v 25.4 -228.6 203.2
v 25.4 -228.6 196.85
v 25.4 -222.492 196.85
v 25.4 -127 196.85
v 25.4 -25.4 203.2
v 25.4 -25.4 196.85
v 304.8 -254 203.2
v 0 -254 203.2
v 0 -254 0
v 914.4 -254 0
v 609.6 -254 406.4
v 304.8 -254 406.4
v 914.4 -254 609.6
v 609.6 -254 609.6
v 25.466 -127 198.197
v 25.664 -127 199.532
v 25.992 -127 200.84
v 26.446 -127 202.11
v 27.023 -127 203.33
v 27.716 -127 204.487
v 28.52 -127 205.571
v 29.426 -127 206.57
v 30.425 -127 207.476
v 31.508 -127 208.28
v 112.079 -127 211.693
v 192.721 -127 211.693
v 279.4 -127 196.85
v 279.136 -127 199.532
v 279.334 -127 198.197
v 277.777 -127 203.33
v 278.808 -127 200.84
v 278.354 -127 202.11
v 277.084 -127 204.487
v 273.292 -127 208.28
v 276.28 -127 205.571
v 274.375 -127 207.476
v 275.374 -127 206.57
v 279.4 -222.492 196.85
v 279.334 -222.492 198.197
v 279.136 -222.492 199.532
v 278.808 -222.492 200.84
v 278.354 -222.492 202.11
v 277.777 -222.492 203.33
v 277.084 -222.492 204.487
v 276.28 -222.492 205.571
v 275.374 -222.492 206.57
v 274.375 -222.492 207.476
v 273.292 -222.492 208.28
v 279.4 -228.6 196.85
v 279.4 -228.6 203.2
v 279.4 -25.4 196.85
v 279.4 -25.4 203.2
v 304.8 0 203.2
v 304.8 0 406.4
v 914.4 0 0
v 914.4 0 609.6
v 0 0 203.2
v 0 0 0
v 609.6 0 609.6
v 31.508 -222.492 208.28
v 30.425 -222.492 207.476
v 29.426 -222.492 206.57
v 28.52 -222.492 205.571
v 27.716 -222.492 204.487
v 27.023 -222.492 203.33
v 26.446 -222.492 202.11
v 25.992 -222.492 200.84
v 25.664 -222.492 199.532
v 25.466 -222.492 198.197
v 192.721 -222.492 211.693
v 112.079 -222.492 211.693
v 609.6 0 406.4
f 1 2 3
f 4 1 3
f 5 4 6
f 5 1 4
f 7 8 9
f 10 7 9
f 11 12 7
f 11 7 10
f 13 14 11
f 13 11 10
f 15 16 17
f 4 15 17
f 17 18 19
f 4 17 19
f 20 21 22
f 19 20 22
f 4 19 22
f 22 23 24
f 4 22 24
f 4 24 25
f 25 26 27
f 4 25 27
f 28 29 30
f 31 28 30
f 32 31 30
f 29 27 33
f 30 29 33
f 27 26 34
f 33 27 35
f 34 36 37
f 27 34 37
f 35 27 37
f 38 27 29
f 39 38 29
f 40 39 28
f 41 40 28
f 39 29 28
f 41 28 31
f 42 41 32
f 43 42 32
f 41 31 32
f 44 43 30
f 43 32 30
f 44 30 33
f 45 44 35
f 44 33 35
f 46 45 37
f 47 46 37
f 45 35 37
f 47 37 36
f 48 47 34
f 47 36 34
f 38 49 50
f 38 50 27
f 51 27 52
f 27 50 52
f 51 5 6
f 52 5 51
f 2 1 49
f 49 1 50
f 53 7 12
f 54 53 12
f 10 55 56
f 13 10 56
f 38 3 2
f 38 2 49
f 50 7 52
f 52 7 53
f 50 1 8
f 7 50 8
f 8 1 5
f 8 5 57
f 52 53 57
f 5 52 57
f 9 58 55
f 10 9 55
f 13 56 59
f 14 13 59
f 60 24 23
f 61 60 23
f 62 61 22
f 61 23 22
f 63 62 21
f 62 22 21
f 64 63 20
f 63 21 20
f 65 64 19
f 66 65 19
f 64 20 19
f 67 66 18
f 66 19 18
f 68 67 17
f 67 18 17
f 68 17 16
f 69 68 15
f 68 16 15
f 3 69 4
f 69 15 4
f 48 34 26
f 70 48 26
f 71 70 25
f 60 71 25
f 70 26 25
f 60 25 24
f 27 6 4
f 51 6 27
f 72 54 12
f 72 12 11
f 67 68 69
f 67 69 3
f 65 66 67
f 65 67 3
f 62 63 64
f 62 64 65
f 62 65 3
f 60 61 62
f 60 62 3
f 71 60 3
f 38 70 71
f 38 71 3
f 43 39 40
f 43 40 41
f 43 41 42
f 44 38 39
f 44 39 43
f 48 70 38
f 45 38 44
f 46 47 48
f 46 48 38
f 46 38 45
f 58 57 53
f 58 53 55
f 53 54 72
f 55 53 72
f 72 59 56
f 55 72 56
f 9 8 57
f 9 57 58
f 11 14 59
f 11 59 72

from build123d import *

# Parameters (mm, degrees)
F0_W     = 304.8
F0_H     = 203.2
F1_DEPTH = 254
F2_W     = 254
F2_H     = 203.2
F3_DEPTH = 6.35
F7_DEPTH = 95.491579


with BuildPart() as f1:
    # F0 (on Front) → F1 (new body)
    with BuildSketch(Plane.XZ):
        with Locations((457.2, 304.8)):
            Rectangle(F0_W, F0_H)
        Polygon((609.6, 203.2), (914.4, 203.2), (914.4, 609.6), (609.6, 609.6), (609.6, 406.4), align=None)
        Polygon((0, 203.2), (0, 0), (914.4, 0), (914.4, 203.2), (609.6, 203.2), (304.8, 203.2), align=None)
    extrude(amount=F1_DEPTH)

    # F2 (on face) → F3 (cut)
    with BuildSketch(Plane.XY.offset(203.2)):
        with Locations((152.4, -127)):
            Rectangle(F2_W, F2_H)
    extrude(amount=-F3_DEPTH, mode=Mode.SUBTRACT)

    # F6 (on offset) → F7 (join)
    with BuildSketch(Plane.XZ.offset(127)):
        with BuildLine():
            ThreePointArc((273.291586, 208.28), (152.400003, 212.119769), (31.50842, 208.28))
            ThreePointArc((31.50842, 208.28), (27.022893, 203.329925), (25.4, 196.85))
            Line((25.4, 196.85), (279.4, 196.85))
            ThreePointArc((279.4, 196.85), (277.777109, 203.329923), (273.291586, 208.28))
        make_face()
    extrude(amount=F7_DEPTH)


solid = f1.part
